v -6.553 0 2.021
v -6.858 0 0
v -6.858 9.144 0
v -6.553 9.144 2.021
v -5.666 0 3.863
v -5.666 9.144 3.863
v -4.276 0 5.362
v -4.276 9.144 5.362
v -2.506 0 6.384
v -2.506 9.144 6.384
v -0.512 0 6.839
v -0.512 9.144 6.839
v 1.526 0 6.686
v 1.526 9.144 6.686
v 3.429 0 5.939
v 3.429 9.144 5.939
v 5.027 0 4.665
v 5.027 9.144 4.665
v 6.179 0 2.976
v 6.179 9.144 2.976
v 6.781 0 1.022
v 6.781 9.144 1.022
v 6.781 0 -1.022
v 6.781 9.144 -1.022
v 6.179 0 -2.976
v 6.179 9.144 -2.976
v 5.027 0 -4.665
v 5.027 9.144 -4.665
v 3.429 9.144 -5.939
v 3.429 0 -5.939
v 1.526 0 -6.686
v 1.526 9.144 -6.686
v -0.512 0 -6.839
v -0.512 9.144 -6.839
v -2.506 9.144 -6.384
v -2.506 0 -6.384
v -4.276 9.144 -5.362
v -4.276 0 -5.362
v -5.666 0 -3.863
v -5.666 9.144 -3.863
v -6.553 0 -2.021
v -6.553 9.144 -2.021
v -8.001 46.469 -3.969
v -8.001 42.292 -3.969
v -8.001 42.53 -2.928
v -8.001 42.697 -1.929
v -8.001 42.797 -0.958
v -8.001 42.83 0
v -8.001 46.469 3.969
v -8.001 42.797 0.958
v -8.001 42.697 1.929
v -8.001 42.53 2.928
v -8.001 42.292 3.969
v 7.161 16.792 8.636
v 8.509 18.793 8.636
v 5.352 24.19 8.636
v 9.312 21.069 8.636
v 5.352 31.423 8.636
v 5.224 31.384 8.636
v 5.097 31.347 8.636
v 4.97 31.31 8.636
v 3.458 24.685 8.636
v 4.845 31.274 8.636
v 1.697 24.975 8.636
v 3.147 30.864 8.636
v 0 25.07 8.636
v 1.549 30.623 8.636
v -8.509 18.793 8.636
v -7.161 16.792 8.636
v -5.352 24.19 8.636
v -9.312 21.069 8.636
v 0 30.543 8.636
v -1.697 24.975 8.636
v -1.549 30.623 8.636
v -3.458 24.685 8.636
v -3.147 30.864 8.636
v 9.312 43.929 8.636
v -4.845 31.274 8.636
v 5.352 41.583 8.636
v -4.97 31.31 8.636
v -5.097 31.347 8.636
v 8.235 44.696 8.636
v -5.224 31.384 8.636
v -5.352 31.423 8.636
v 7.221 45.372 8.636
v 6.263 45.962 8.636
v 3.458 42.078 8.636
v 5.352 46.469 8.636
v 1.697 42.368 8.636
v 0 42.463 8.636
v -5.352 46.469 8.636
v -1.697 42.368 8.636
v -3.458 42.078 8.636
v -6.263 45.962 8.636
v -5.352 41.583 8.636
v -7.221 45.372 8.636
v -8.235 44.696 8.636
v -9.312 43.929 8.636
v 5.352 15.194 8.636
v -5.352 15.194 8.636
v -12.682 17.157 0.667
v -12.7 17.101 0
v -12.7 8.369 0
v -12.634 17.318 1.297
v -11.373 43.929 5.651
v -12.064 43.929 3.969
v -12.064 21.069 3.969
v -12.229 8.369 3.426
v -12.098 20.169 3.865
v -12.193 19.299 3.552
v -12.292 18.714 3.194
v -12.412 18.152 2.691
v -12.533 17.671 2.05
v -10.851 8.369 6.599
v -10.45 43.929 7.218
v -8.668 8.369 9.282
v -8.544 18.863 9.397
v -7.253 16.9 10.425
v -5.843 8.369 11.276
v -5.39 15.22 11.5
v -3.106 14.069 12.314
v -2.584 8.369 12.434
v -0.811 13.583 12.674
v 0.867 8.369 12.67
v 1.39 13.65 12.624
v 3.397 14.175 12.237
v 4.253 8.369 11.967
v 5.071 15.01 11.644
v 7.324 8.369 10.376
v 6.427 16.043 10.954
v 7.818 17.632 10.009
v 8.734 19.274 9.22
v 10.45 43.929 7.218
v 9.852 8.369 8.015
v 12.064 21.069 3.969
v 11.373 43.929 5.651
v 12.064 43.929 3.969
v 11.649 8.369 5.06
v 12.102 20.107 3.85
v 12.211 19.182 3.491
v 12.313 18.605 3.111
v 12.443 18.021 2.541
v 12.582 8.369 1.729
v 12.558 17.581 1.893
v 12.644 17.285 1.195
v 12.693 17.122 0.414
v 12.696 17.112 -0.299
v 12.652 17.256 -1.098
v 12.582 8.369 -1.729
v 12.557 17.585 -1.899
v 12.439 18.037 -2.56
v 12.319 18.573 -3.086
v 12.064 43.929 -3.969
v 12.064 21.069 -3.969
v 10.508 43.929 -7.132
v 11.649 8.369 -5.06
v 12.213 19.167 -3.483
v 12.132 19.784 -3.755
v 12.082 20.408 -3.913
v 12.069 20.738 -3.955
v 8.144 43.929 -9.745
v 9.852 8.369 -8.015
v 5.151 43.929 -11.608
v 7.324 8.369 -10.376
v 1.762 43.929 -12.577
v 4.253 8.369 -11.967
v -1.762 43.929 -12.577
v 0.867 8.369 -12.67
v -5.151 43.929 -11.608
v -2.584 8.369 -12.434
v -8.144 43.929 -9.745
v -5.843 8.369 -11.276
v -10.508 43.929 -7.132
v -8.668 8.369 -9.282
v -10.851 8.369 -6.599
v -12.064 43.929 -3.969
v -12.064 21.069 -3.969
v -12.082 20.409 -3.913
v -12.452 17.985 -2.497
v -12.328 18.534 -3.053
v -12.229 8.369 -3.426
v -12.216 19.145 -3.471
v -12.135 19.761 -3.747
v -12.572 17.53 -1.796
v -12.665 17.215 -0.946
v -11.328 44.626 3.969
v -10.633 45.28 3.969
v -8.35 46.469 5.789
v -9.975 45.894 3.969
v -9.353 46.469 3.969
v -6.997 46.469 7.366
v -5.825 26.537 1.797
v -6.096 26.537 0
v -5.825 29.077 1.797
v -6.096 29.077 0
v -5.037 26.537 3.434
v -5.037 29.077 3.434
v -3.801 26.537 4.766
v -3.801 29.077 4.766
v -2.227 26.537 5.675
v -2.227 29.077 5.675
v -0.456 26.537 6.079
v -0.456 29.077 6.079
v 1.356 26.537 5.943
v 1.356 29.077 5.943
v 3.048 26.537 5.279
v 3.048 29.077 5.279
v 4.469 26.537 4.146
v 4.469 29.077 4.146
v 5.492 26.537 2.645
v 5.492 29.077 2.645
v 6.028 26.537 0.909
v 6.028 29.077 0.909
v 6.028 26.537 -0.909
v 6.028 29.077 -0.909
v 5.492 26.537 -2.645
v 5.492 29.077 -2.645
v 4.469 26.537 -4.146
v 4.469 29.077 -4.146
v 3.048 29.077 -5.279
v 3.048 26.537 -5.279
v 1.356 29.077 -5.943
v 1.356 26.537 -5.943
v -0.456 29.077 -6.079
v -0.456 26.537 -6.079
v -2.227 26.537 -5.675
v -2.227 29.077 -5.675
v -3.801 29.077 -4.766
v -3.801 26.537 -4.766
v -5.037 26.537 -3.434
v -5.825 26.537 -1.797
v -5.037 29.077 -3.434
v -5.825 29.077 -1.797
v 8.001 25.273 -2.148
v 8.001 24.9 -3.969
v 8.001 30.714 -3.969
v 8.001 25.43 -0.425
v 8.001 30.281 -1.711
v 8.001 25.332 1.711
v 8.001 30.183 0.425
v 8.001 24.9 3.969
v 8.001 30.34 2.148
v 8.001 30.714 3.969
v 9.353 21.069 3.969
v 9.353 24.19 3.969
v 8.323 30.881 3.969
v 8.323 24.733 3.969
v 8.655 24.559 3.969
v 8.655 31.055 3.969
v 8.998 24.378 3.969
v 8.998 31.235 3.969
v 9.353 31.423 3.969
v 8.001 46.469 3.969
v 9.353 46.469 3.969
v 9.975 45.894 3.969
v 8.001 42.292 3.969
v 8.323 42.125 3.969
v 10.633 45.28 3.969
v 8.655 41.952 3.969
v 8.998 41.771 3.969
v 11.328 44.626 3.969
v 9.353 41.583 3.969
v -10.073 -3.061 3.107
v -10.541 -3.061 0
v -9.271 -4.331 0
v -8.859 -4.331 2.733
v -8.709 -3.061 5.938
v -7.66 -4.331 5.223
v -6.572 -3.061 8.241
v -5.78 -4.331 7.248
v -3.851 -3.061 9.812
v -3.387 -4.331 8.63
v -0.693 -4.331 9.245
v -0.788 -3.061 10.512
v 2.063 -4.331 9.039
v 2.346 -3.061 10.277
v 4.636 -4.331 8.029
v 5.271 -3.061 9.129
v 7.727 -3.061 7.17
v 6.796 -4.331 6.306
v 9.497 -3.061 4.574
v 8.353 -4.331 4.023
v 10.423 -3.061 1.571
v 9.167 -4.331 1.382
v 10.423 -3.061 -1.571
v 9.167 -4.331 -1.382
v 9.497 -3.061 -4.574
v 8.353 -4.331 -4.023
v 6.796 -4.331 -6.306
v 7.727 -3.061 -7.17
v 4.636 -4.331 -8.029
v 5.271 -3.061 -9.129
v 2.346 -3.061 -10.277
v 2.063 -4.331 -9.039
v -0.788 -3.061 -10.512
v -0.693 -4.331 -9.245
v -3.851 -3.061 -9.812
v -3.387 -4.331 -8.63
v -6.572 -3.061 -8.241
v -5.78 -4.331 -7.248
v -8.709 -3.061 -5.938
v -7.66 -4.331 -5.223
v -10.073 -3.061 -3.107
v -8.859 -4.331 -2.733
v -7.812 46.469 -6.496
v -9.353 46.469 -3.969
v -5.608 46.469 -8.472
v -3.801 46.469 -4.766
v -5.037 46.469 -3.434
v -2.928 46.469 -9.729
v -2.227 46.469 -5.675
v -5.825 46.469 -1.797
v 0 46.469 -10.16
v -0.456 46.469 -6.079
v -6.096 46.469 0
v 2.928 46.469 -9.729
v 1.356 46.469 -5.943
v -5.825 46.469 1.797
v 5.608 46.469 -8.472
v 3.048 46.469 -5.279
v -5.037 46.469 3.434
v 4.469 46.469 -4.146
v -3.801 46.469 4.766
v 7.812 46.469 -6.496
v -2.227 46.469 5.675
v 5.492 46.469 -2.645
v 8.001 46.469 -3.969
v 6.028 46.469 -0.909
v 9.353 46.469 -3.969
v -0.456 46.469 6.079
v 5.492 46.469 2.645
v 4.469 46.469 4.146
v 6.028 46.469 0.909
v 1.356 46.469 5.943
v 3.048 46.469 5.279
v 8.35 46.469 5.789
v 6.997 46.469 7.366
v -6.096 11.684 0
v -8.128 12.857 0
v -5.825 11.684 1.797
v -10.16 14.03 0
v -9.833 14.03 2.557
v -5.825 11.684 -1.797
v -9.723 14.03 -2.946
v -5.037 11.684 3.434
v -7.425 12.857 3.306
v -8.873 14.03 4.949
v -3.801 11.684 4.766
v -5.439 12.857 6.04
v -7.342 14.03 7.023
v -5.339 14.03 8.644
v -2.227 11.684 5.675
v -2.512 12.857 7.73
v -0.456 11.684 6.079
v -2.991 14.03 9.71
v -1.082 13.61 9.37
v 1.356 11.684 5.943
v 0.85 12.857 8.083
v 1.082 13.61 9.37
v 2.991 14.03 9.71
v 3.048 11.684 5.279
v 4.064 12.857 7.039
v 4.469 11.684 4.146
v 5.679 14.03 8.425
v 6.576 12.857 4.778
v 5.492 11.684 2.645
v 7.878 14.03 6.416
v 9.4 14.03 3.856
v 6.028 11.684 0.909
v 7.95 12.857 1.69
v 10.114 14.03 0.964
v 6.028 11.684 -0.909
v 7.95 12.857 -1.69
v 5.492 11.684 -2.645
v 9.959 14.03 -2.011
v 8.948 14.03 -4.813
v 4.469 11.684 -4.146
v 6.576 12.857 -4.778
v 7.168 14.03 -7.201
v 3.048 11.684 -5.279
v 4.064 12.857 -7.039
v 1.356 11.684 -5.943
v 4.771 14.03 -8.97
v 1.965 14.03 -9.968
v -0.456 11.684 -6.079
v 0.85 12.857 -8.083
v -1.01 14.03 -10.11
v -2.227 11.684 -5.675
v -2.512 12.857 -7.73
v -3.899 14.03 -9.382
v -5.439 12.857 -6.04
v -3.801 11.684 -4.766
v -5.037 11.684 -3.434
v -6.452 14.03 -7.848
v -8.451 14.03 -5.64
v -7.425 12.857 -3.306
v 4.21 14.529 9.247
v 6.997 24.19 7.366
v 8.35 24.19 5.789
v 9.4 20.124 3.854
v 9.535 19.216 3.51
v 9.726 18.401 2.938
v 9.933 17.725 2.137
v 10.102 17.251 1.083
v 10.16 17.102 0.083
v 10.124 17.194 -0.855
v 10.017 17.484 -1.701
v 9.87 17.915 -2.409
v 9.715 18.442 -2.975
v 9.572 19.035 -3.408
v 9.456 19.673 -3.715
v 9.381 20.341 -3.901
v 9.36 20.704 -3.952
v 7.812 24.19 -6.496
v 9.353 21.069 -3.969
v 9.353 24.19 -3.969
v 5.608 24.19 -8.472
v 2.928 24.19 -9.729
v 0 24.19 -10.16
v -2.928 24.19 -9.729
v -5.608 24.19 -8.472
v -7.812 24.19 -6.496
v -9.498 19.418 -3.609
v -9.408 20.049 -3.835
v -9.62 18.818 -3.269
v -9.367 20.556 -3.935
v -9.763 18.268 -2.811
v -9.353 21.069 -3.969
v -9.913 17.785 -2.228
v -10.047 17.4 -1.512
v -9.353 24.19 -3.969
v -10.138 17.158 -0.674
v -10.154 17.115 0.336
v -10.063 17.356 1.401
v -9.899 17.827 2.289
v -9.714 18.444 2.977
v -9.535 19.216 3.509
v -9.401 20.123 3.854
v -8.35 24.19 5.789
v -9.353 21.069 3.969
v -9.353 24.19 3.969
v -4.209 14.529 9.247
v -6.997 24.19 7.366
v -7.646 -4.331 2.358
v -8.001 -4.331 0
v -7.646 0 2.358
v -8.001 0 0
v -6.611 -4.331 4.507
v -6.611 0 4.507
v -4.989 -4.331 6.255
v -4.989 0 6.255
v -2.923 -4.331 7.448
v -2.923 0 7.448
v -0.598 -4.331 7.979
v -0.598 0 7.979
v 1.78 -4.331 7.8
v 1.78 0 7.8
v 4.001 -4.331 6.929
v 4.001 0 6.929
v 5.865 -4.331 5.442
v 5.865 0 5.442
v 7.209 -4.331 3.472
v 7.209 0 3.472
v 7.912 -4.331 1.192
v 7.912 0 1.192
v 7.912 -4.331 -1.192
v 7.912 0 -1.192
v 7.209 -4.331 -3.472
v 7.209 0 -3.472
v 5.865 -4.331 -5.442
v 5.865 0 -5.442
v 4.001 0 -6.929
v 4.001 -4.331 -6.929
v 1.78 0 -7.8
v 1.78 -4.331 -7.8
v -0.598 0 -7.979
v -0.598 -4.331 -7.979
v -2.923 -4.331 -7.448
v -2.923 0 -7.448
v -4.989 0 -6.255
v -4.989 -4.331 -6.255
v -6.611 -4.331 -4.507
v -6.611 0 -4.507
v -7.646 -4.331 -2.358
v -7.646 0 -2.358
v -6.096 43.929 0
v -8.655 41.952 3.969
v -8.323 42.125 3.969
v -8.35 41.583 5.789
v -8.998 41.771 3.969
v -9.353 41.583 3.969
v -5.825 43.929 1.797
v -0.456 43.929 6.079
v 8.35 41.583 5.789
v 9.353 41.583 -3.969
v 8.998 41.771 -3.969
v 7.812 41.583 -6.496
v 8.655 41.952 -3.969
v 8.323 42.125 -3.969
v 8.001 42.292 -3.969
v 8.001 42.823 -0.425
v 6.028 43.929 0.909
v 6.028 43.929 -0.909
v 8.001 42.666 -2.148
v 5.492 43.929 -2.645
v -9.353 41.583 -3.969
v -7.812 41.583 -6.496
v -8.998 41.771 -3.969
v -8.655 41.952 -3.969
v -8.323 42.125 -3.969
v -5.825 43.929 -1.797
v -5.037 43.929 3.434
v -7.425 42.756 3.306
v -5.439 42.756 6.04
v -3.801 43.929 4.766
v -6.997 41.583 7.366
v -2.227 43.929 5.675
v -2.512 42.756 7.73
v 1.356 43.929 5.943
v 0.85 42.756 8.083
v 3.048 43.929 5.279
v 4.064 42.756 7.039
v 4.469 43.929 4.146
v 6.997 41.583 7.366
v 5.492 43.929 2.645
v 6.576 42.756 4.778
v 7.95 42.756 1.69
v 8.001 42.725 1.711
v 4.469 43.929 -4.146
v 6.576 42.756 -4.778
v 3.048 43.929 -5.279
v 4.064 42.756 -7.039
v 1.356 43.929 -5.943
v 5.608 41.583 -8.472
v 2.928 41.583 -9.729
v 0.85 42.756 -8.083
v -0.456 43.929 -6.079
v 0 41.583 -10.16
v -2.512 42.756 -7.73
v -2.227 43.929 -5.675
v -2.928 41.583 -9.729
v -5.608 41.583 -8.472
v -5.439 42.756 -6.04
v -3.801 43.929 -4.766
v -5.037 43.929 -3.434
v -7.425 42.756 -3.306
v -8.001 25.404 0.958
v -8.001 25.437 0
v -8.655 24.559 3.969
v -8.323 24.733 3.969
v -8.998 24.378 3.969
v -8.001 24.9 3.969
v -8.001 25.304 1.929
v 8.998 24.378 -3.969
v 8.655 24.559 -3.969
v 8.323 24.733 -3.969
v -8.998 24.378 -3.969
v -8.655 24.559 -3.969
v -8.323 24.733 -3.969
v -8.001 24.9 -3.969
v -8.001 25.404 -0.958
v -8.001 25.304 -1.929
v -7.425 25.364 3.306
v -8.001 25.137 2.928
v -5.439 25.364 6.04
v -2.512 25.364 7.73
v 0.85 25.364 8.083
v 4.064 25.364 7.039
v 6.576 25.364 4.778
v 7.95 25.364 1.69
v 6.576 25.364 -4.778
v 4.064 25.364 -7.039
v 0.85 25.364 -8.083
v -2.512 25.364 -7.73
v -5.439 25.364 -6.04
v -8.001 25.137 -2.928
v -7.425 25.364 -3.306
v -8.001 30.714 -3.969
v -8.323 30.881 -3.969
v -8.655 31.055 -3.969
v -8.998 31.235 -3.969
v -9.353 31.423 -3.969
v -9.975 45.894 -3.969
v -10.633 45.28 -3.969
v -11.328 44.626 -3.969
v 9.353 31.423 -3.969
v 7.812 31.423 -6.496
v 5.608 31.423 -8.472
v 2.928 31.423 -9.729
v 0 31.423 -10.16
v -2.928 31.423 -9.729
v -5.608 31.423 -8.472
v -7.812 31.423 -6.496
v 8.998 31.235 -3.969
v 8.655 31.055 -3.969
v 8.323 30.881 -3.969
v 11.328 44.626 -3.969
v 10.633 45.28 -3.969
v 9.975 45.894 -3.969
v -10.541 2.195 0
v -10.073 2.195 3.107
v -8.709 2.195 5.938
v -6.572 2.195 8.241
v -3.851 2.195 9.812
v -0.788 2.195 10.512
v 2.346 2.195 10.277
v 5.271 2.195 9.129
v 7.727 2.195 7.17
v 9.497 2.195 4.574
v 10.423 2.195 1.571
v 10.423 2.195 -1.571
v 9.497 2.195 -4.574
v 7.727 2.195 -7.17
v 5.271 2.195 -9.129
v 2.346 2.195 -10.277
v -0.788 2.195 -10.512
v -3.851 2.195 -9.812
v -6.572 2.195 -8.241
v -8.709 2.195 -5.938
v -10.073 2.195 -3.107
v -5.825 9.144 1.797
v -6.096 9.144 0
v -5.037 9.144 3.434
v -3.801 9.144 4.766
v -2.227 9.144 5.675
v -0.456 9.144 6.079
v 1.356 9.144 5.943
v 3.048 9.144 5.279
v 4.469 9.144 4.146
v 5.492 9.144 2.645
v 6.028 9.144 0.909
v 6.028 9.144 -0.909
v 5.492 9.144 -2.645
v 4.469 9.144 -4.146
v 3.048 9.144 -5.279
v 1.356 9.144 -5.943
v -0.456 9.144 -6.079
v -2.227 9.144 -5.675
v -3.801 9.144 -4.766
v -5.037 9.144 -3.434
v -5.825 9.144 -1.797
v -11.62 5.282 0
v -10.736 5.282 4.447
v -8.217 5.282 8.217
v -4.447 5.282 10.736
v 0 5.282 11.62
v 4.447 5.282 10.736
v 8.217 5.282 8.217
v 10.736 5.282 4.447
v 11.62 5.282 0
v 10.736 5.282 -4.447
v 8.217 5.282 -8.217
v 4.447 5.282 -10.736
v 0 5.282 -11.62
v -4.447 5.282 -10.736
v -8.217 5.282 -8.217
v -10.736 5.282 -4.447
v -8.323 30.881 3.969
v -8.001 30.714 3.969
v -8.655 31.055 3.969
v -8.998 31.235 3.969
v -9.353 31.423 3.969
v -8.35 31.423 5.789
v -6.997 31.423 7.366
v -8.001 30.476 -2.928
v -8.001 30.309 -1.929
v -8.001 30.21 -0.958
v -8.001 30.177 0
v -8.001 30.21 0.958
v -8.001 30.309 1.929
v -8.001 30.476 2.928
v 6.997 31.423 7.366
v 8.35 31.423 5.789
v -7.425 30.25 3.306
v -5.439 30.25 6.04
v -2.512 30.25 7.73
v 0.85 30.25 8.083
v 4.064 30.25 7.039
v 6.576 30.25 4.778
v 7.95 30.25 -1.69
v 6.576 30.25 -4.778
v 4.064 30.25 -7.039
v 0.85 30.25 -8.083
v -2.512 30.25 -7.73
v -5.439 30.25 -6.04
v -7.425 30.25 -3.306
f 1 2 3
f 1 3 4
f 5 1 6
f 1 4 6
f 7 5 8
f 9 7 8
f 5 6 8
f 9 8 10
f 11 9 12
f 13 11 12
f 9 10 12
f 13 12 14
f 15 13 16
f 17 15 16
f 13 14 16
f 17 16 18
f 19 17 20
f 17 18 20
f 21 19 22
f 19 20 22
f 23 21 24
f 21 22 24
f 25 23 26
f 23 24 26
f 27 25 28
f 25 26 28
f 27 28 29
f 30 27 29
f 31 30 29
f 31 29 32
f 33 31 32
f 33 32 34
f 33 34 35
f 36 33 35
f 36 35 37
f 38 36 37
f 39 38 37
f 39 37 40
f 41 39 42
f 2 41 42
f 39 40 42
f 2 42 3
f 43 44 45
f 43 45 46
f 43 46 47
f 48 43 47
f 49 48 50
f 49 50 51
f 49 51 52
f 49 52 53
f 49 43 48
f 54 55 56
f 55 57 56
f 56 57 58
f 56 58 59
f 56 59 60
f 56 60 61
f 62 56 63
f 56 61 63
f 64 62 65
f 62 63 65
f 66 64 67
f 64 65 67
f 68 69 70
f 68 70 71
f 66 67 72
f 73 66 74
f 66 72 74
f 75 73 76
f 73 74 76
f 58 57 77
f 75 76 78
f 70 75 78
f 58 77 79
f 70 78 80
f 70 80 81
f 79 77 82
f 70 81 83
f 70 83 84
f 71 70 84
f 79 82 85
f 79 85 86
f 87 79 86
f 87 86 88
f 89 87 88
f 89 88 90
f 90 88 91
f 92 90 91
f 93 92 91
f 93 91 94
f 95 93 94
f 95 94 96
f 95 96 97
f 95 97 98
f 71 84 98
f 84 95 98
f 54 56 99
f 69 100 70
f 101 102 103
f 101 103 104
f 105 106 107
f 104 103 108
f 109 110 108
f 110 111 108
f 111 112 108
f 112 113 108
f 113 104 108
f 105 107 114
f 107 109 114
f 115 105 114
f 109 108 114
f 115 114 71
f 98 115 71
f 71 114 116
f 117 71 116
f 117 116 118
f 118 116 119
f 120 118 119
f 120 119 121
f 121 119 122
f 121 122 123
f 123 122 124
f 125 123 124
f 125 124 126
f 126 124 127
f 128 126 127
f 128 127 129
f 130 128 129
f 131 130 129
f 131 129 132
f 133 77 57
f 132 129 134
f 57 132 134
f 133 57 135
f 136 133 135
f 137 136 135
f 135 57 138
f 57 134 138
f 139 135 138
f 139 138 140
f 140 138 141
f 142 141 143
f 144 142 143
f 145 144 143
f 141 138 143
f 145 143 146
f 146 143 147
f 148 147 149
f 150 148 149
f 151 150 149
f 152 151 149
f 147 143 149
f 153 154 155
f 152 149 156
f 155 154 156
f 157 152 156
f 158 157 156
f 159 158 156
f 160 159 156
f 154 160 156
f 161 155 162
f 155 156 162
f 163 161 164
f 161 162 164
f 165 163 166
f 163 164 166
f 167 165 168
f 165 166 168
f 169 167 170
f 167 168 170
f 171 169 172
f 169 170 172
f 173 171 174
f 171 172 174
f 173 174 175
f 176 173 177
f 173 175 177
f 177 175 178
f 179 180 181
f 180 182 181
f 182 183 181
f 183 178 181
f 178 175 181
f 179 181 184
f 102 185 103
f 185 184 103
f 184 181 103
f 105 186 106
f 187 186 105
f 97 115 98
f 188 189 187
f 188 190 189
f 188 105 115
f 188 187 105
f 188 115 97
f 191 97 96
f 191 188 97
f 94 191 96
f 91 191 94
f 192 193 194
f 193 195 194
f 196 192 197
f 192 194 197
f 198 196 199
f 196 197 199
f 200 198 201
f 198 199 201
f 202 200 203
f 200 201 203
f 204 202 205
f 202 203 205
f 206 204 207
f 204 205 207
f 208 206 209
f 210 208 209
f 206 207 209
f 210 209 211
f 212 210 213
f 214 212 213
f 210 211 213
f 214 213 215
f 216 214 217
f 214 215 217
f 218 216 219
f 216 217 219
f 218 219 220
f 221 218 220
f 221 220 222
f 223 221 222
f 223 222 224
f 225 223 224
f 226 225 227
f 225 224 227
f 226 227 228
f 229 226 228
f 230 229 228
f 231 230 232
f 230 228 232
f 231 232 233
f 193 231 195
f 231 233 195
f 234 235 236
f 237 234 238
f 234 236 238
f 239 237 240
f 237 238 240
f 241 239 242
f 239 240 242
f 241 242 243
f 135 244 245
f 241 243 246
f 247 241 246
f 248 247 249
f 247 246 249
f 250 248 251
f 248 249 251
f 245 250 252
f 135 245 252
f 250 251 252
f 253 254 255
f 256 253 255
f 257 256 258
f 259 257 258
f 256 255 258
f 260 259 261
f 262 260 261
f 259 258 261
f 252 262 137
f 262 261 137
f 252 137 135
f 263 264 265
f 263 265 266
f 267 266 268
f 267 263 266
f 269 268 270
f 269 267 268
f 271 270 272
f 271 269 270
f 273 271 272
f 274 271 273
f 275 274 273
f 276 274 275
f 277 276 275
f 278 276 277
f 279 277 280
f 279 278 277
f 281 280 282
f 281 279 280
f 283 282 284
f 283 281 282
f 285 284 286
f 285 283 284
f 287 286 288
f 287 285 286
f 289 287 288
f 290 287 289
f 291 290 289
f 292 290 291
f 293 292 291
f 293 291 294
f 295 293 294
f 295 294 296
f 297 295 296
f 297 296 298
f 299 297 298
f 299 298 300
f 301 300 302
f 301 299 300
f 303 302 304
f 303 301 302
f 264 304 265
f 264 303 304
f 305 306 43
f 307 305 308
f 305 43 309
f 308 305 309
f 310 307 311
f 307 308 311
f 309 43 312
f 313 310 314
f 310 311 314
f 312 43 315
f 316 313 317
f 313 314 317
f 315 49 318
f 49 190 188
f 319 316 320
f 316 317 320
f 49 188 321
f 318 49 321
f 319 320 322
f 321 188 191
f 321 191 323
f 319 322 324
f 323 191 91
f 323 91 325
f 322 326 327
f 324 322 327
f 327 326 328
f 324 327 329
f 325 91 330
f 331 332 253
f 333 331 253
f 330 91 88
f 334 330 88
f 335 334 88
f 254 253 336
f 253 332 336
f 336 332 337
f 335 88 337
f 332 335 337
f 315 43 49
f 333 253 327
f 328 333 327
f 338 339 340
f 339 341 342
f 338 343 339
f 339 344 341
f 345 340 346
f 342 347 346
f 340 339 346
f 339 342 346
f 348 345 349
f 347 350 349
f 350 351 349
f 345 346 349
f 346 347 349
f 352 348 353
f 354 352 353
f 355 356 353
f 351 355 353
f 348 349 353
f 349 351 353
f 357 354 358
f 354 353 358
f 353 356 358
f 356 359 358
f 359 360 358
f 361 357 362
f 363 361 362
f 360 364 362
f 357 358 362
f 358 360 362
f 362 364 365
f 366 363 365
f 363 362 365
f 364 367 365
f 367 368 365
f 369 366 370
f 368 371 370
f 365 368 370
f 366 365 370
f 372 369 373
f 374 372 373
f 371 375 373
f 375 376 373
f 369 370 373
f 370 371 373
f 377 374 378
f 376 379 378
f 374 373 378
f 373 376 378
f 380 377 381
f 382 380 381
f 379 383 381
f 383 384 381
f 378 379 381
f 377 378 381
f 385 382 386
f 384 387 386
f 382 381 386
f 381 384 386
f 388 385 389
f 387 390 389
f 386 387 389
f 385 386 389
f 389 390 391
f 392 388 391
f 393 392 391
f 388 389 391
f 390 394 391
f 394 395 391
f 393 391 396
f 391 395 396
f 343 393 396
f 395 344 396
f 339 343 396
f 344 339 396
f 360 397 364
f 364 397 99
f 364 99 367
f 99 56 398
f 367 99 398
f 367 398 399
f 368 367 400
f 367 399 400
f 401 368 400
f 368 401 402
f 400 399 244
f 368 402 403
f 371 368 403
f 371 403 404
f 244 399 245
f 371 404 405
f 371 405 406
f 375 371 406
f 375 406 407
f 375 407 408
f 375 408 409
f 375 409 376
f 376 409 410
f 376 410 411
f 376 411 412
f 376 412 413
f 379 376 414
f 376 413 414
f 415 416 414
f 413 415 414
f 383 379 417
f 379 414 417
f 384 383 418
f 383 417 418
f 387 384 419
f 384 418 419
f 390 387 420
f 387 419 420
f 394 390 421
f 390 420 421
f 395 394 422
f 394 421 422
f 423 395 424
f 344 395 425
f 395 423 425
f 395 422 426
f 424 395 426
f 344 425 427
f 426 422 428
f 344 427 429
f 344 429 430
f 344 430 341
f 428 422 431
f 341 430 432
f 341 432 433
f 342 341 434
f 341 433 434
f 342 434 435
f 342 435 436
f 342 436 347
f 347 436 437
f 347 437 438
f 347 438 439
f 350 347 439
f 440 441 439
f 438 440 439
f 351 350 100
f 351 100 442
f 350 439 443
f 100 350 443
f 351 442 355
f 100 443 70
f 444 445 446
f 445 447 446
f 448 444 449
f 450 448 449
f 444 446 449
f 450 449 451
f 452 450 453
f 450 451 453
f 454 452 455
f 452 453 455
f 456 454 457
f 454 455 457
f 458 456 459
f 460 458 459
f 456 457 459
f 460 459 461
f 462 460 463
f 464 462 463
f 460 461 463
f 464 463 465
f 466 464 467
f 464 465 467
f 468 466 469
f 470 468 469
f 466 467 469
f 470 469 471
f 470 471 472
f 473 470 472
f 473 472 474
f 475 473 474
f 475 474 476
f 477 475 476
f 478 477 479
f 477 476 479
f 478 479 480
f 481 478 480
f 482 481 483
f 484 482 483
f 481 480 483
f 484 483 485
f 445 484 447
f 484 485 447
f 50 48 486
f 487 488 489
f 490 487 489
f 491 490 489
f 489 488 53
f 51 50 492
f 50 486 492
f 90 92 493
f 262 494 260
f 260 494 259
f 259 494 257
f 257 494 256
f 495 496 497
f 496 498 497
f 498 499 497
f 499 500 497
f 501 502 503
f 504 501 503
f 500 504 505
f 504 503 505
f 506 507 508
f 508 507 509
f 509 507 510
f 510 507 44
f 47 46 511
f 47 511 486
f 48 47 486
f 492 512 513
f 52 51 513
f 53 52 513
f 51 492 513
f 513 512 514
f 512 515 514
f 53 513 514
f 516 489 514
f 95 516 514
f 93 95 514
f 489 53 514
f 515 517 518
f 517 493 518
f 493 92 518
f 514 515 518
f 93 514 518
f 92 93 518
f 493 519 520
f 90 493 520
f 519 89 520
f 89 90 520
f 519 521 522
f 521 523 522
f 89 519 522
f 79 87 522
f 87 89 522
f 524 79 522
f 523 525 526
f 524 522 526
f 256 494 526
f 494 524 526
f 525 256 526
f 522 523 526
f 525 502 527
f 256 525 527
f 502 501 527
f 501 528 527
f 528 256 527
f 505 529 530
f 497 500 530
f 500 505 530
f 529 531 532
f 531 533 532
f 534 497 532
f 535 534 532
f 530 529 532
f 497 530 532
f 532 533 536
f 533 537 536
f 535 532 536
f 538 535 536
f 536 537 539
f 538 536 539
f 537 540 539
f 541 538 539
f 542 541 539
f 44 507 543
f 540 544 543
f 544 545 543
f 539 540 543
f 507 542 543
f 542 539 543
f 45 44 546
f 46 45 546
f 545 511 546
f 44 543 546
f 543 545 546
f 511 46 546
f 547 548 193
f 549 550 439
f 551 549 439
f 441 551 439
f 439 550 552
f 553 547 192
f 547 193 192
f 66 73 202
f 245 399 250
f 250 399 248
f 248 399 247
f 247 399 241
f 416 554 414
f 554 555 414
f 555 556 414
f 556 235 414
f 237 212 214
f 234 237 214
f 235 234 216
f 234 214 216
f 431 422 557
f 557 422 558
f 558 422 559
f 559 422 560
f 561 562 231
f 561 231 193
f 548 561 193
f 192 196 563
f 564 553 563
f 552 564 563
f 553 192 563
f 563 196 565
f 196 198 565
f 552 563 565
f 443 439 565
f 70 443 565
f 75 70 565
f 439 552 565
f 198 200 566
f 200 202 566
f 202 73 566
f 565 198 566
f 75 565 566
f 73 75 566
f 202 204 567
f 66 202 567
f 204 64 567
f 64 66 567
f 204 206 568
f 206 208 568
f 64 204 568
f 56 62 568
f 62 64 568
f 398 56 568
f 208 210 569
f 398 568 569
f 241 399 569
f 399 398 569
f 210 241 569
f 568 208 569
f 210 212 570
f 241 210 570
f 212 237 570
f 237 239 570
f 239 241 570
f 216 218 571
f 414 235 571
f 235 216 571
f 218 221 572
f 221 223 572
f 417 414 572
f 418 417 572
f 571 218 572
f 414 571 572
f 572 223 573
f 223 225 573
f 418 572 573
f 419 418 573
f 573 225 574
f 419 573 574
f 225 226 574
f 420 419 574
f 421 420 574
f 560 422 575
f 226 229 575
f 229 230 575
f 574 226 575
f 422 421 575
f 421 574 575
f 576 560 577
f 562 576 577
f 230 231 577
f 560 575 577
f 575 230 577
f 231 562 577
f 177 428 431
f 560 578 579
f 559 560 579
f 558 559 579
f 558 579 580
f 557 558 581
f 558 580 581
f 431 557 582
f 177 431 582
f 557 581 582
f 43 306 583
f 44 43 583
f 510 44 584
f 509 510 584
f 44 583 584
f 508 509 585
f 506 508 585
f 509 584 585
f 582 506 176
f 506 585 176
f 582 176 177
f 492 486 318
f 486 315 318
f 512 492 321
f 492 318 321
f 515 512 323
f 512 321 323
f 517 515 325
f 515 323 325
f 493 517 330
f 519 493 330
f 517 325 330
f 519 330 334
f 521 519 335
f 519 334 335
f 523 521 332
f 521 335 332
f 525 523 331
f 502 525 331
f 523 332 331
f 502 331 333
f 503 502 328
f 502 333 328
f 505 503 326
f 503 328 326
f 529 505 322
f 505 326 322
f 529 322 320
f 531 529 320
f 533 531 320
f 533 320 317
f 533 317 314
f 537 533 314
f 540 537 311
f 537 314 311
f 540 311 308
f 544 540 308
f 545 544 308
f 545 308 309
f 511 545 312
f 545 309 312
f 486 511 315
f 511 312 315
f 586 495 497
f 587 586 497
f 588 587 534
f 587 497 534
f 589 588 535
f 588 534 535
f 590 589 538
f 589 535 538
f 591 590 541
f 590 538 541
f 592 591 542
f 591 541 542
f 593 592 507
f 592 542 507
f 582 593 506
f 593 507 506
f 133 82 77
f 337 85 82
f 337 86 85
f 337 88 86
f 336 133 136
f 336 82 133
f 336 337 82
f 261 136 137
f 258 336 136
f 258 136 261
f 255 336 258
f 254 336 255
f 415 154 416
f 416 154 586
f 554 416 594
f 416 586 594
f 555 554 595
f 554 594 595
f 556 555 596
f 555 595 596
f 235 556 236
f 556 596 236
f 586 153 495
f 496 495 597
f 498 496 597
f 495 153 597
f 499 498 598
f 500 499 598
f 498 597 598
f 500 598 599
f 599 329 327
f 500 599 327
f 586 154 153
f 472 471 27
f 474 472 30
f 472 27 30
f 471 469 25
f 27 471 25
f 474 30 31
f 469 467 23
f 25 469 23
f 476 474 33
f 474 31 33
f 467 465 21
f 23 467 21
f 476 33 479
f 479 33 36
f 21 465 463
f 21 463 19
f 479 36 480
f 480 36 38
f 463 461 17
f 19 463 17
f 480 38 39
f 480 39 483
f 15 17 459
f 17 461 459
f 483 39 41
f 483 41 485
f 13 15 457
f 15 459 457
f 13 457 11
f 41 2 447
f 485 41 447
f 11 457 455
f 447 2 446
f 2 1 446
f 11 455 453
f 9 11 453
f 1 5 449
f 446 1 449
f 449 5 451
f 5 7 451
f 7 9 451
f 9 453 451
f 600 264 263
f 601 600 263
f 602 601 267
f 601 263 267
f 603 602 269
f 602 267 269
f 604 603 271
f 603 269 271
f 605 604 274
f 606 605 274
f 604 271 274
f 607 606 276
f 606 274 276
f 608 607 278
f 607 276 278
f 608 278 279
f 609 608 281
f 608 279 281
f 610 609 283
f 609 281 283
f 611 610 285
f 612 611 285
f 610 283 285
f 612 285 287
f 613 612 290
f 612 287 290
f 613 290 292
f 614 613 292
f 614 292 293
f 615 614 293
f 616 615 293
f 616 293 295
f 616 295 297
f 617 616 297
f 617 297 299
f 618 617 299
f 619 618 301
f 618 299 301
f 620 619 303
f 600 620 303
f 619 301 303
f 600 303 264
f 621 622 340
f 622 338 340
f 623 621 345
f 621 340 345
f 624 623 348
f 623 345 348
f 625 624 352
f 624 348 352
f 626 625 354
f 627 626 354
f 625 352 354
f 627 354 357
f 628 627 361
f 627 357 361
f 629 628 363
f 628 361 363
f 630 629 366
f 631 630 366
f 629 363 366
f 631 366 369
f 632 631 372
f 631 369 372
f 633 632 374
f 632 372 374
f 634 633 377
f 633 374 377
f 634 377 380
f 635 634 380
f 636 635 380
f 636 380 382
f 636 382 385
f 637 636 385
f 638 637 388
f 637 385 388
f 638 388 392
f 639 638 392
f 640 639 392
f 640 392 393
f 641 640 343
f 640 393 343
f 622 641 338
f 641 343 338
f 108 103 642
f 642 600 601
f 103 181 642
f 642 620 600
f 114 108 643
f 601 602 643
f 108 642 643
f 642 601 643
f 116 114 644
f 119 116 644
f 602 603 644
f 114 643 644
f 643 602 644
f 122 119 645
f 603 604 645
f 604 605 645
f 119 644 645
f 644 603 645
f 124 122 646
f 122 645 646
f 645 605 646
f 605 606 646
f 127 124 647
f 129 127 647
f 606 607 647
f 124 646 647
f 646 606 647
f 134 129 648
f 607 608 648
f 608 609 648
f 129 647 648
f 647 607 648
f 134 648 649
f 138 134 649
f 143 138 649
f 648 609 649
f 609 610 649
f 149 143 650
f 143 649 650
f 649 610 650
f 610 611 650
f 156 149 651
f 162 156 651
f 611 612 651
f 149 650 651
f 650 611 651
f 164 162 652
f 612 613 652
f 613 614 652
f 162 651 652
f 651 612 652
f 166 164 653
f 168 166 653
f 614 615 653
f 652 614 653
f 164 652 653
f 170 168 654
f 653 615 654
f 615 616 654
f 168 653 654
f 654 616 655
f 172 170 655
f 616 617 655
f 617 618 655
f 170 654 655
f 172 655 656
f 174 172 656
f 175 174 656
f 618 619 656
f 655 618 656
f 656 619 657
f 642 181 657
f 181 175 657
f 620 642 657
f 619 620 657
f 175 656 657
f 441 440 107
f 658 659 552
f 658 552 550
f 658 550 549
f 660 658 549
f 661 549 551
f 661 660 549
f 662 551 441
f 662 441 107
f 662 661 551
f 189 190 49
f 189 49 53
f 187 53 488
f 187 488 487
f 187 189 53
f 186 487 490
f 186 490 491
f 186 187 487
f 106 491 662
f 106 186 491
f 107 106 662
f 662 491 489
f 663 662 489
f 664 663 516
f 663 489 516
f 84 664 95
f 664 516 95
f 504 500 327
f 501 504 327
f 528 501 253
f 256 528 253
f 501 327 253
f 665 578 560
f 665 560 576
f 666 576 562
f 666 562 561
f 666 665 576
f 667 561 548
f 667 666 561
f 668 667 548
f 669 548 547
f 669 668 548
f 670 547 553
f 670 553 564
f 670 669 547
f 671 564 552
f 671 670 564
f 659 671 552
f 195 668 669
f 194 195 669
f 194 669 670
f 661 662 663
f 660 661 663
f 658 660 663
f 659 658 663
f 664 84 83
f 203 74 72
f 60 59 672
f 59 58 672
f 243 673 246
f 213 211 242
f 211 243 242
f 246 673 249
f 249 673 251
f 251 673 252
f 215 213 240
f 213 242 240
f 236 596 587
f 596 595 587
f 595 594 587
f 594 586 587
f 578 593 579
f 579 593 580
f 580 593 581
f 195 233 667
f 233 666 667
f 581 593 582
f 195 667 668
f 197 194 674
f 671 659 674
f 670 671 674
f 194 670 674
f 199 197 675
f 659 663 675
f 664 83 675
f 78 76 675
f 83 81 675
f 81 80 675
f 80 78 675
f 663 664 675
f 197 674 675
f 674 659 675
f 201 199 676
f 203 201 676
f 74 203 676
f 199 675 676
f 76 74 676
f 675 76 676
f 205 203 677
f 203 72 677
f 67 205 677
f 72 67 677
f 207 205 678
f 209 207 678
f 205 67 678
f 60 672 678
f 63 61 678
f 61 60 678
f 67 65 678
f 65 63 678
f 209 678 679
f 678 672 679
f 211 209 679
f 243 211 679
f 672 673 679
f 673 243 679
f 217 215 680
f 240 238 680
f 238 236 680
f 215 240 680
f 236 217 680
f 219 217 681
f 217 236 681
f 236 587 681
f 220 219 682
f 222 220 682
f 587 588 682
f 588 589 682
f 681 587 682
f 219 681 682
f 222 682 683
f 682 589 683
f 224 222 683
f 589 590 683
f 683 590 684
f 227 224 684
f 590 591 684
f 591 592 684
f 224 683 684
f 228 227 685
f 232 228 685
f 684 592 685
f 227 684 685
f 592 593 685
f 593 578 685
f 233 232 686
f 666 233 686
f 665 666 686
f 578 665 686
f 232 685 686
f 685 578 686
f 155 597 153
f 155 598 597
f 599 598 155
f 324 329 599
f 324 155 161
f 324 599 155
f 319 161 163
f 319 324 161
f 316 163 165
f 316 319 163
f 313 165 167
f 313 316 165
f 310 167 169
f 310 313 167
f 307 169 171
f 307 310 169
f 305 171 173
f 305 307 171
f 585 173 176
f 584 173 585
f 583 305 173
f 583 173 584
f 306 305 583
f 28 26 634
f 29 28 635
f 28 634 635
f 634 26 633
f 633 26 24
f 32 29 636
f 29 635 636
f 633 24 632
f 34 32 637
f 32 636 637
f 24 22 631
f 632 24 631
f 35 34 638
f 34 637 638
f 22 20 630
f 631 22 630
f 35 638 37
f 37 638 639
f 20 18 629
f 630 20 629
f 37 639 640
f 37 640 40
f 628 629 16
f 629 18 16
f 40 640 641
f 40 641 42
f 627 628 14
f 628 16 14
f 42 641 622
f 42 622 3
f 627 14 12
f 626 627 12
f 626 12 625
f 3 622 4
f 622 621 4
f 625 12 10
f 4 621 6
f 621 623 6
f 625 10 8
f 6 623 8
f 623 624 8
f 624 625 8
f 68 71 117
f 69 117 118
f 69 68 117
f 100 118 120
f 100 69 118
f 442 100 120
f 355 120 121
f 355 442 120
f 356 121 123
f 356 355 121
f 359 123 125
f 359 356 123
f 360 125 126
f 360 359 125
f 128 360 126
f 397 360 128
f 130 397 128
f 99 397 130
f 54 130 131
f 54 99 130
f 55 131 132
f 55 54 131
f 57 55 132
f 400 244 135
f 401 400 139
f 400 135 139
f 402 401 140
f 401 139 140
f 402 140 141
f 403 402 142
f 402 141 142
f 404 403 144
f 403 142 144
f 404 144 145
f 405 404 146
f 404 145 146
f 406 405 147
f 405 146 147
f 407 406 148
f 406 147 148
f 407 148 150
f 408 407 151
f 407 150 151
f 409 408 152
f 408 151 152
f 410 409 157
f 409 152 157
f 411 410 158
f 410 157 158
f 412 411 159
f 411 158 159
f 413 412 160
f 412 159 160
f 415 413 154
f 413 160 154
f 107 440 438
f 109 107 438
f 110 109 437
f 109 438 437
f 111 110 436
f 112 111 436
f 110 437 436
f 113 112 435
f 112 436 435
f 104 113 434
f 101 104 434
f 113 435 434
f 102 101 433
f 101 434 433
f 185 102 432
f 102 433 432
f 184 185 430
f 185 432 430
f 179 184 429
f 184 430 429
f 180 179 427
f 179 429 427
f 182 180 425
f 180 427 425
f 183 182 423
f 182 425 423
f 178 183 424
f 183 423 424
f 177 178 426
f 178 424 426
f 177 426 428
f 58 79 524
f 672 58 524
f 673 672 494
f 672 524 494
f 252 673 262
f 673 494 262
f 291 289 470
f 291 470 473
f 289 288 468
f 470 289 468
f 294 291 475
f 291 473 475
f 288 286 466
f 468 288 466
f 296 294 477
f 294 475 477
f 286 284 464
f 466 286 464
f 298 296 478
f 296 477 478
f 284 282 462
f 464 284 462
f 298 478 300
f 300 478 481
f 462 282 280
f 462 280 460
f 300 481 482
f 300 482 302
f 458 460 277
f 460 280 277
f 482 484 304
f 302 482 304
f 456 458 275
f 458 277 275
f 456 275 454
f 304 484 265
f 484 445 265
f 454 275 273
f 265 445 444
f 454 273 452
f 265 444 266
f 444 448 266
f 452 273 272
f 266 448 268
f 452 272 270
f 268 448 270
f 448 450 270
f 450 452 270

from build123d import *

# Parameters (mm, degrees)
F3_DEPTH  = 25.4
F4_W      = 12.7
F4_H      = 7.9375
F5_DEPTH  = 25.4
F6_SIZE   = 2.54
F7_R      = 9.525
F8_DEPTH  = 25.4
F9_SIZE   = 1.27
F10_R     = 3.96875
F11_DEPTH = 25.4


with BuildPart() as f1:
    # F0 (on Top) → F1 (revolve)
    with BuildSketch(Plane.XY):
        Polygon((-12.7, 8.3694059759), (-10.541, 2.1945910865), (-10.541, -4.3305940241), (-8.001, -4.3305940241), (-8.001, 0), (-6.858, 0), (-6.858, 9.144), (-6.096, 9.144), (-6.096, 11.684), (-10.16, 14.030351494), (-10.16, 24.190351494), (-6.096, 26.536702988), (-6.096, 29.076702988), (-10.16, 31.423054482), (-10.16, 41.583054482), (-6.096, 43.9294059759), (-6.096, 46.4694059759), (-12.7, 46.4694059759), align=None)
    revolve(axis=Axis((0, 65.4240736527, 0), (0, 1, 0)))

    # F2 (on face) → F3 (cut)
    with BuildSketch(Plane(origin=(0, 46.4694059759, 0), x_dir=(-1, 0, 0), z_dir=(0, 1, 0))):
        Polygon((-25.4, 8.636), (0, 8.636), (25.4, 8.636), (25.4, 25.7254446054), (-25.4, 25.7254446054), align=None)
    extrude(amount=-F3_DEPTH, mode=Mode.SUBTRACT)

    # F4 (on face) → F5 (cut)
    with BuildSketch(Plane(origin=(0, 46.4694059759, 0), x_dir=(-1, 0, 0), z_dir=(0, 1, 0))):
        Polygon((-8.001, 0), (-8.001, 3.96875), (-20.701, 3.96875), (-20.701, -3.96875), (-8.001, -3.96875), align=None)
        with Locations((14.351, 0)):
            Rectangle(F4_W, F4_H)
    extrude(amount=-F5_DEPTH, mode=Mode.SUBTRACT)

    # F6
    f6_edges = [f1.edges().sort_by_distance(p)[0] for p in [
        (10.939674, 46.469406, 6.450855),
        (0, 46.469406, -12.7),
        (-10.939674, 46.469406, 6.450855),
    ]]
    chamfer(f6_edges, length=F6_SIZE)

    # F7 (on face) → F8 (cut)
    with BuildSketch(Plane.XY.offset(8.636)):
        with Locations((0, 23.0734321734)):
            Circle(F7_R)
    extrude(amount=F8_DEPTH, mode=Mode.SUBTRACT)

    # F9
    f9_edges = [f1.edges().sort_by_distance(p)[0] for p in [
        (10.541, -4.330594, 0),
    ]]
    chamfer(f9_edges, length=F9_SIZE)

    # F10 (on face) → F11 (cut, symmetric)
    with BuildSketch(Plane.YZ.offset(8.001)):
        with Locations((21.0694059759, 0)):
            Circle(F10_R)
    extrude(amount=F11_DEPTH, both=True, mode=Mode.SUBTRACT)


solid = f1.part
